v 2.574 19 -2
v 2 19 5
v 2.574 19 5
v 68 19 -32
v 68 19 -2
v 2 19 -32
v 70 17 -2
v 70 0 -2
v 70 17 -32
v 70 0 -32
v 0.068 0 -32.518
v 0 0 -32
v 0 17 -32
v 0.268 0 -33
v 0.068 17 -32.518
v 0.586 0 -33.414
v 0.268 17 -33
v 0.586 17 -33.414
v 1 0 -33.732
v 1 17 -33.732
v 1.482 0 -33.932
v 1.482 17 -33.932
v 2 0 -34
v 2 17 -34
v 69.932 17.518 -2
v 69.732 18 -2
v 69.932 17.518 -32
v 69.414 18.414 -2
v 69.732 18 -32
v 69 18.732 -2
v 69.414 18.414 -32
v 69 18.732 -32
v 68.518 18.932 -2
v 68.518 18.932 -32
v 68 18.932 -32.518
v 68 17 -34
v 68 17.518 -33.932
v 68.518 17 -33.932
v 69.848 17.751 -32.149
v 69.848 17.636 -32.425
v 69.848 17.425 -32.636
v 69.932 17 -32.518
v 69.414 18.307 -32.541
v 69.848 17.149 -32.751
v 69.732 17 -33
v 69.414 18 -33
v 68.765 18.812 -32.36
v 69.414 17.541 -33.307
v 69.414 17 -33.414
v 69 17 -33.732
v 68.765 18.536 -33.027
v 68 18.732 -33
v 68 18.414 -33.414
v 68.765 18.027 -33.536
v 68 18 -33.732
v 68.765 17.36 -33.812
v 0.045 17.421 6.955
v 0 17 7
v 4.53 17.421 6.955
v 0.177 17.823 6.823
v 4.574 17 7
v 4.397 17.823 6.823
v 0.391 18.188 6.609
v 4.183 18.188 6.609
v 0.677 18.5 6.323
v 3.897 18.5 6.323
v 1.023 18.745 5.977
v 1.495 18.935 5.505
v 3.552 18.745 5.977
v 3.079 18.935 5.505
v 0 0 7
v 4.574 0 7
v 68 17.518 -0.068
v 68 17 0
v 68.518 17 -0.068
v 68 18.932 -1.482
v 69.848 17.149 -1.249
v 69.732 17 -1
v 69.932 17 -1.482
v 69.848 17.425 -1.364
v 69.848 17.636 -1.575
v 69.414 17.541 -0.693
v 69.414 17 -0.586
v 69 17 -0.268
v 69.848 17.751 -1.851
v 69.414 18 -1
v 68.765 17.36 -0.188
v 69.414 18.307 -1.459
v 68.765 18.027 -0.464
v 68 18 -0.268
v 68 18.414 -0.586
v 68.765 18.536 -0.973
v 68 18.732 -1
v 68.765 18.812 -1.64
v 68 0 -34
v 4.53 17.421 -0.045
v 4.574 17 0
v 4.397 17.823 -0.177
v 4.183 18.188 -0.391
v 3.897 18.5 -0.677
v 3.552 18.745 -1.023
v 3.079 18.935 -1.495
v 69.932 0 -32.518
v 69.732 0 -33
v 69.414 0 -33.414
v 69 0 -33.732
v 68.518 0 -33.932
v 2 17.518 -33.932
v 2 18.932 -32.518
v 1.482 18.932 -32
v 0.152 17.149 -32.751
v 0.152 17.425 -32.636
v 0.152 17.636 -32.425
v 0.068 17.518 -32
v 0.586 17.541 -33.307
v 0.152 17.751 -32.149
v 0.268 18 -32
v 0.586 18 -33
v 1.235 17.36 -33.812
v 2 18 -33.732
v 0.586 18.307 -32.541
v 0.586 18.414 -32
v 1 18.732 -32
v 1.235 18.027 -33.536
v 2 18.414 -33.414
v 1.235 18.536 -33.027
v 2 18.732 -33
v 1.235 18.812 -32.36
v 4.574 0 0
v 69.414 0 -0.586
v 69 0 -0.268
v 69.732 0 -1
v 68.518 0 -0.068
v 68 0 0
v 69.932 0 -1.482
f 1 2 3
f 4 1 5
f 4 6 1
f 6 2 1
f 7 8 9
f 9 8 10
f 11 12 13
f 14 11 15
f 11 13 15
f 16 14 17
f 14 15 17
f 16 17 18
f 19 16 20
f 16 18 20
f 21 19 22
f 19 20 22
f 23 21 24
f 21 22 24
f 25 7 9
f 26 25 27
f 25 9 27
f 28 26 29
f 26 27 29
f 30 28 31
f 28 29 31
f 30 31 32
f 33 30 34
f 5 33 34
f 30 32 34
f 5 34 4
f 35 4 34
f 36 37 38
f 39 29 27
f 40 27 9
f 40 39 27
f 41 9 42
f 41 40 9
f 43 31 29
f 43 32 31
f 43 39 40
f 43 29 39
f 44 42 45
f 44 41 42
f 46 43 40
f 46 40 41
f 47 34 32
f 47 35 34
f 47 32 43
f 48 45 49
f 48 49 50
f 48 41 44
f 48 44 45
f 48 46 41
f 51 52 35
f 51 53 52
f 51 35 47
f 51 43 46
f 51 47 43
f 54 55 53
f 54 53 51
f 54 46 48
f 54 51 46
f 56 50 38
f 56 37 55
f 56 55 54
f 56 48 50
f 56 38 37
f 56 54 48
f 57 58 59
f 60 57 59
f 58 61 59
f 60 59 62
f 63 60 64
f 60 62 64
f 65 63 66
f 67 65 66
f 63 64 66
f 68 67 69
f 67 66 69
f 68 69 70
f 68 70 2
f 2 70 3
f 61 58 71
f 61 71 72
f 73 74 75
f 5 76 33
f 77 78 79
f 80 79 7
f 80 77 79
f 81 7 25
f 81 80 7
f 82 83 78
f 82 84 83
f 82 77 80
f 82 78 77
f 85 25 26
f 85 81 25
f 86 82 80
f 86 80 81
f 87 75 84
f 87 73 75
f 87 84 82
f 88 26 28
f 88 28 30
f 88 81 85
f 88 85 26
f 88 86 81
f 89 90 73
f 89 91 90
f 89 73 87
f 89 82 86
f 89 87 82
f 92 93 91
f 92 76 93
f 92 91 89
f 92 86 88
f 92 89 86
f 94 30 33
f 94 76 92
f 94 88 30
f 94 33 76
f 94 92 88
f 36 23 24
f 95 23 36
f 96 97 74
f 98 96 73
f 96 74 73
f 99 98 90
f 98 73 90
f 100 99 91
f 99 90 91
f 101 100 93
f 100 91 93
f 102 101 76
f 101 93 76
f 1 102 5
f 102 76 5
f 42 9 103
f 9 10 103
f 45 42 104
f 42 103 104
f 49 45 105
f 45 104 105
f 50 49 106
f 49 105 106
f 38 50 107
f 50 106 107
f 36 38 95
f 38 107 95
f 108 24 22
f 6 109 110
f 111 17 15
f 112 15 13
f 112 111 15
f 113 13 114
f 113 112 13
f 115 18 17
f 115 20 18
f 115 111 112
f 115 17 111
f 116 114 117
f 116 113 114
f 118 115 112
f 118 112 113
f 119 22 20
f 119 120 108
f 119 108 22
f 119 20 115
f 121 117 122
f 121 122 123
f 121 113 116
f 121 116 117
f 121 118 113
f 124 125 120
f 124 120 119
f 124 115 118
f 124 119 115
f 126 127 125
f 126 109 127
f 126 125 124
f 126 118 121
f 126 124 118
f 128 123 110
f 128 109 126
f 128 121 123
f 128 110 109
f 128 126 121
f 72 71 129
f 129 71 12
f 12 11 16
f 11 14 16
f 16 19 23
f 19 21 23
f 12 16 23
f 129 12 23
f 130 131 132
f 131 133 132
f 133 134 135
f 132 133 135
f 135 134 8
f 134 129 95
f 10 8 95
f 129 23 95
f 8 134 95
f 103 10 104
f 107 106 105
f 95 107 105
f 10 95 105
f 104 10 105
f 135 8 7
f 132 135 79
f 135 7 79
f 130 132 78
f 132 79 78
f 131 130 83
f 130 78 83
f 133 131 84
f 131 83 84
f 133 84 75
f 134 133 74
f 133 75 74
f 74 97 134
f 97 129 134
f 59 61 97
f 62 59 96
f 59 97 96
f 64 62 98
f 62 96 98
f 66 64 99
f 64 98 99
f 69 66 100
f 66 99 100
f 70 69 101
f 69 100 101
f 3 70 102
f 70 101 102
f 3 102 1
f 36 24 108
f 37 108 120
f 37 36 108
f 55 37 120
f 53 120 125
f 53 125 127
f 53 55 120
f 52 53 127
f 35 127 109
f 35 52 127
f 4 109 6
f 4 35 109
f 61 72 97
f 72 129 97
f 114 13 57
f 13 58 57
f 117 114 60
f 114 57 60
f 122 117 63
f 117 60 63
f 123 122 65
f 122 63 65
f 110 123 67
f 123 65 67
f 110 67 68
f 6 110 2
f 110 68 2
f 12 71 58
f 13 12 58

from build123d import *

# Parameters (mm, degrees)
SKETCH1_W           = 70
SKETCH1_H           = 34
BOSS_EXTRUDE1_DEPTH = 19
SKETCH2_W           = 4.574362022
SKETCH2_H           = 19
BOSS_EXTRUDE2_DEPTH = 7
FILLET2_R           = 2
FILLET3_R           = 2


with BuildPart() as part:
    # Sketch1 → Boss-Extrude1 (new body)
    with BuildSketch(Plane(origin=(0, 0, 0), x_dir=(1, 0, 0), z_dir=(0, 1, 0))):
        with Locations((35, 17)):
            Rectangle(SKETCH1_W, SKETCH1_H)
    extrude(amount=BOSS_EXTRUDE1_DEPTH)

    # Sketch2 → Boss-Extrude2 (add)
    with BuildSketch(Plane.XY):
        with Locations((2.287181011, 9.5)):
            Rectangle(SKETCH2_W, SKETCH2_H)
    extrude(amount=BOSS_EXTRUDE2_DEPTH)

    # Fillet2
    fillet2_edges = [part.edges().sort_by_distance(p)[0] for p in [
        (35, 19, -34),
        (37.287181011, 19, 0),
    ]]
    fillet(fillet2_edges, radius=FILLET2_R)

    # Fillet3
    fillet3_edges = [part.edges().sort_by_distance(p)[0] for p in [
        (0, 8.5, -34),
        (0, 18.414213562, -33.414213562),
        (70, 8.5, 0),
        (70, 18.414213562, -0.585786438),
        (70, 18.414213562, -33.414213562),
        (4.574362022, 19, 2.5),
        (2.287181011, 19, 7),
        (0, 19, -12.5),
        (70, 19, -17),
        (70, 8.5, -34),
    ]]
    fillet(fillet3_edges, radius=FILLET3_R)


solid = part.part
